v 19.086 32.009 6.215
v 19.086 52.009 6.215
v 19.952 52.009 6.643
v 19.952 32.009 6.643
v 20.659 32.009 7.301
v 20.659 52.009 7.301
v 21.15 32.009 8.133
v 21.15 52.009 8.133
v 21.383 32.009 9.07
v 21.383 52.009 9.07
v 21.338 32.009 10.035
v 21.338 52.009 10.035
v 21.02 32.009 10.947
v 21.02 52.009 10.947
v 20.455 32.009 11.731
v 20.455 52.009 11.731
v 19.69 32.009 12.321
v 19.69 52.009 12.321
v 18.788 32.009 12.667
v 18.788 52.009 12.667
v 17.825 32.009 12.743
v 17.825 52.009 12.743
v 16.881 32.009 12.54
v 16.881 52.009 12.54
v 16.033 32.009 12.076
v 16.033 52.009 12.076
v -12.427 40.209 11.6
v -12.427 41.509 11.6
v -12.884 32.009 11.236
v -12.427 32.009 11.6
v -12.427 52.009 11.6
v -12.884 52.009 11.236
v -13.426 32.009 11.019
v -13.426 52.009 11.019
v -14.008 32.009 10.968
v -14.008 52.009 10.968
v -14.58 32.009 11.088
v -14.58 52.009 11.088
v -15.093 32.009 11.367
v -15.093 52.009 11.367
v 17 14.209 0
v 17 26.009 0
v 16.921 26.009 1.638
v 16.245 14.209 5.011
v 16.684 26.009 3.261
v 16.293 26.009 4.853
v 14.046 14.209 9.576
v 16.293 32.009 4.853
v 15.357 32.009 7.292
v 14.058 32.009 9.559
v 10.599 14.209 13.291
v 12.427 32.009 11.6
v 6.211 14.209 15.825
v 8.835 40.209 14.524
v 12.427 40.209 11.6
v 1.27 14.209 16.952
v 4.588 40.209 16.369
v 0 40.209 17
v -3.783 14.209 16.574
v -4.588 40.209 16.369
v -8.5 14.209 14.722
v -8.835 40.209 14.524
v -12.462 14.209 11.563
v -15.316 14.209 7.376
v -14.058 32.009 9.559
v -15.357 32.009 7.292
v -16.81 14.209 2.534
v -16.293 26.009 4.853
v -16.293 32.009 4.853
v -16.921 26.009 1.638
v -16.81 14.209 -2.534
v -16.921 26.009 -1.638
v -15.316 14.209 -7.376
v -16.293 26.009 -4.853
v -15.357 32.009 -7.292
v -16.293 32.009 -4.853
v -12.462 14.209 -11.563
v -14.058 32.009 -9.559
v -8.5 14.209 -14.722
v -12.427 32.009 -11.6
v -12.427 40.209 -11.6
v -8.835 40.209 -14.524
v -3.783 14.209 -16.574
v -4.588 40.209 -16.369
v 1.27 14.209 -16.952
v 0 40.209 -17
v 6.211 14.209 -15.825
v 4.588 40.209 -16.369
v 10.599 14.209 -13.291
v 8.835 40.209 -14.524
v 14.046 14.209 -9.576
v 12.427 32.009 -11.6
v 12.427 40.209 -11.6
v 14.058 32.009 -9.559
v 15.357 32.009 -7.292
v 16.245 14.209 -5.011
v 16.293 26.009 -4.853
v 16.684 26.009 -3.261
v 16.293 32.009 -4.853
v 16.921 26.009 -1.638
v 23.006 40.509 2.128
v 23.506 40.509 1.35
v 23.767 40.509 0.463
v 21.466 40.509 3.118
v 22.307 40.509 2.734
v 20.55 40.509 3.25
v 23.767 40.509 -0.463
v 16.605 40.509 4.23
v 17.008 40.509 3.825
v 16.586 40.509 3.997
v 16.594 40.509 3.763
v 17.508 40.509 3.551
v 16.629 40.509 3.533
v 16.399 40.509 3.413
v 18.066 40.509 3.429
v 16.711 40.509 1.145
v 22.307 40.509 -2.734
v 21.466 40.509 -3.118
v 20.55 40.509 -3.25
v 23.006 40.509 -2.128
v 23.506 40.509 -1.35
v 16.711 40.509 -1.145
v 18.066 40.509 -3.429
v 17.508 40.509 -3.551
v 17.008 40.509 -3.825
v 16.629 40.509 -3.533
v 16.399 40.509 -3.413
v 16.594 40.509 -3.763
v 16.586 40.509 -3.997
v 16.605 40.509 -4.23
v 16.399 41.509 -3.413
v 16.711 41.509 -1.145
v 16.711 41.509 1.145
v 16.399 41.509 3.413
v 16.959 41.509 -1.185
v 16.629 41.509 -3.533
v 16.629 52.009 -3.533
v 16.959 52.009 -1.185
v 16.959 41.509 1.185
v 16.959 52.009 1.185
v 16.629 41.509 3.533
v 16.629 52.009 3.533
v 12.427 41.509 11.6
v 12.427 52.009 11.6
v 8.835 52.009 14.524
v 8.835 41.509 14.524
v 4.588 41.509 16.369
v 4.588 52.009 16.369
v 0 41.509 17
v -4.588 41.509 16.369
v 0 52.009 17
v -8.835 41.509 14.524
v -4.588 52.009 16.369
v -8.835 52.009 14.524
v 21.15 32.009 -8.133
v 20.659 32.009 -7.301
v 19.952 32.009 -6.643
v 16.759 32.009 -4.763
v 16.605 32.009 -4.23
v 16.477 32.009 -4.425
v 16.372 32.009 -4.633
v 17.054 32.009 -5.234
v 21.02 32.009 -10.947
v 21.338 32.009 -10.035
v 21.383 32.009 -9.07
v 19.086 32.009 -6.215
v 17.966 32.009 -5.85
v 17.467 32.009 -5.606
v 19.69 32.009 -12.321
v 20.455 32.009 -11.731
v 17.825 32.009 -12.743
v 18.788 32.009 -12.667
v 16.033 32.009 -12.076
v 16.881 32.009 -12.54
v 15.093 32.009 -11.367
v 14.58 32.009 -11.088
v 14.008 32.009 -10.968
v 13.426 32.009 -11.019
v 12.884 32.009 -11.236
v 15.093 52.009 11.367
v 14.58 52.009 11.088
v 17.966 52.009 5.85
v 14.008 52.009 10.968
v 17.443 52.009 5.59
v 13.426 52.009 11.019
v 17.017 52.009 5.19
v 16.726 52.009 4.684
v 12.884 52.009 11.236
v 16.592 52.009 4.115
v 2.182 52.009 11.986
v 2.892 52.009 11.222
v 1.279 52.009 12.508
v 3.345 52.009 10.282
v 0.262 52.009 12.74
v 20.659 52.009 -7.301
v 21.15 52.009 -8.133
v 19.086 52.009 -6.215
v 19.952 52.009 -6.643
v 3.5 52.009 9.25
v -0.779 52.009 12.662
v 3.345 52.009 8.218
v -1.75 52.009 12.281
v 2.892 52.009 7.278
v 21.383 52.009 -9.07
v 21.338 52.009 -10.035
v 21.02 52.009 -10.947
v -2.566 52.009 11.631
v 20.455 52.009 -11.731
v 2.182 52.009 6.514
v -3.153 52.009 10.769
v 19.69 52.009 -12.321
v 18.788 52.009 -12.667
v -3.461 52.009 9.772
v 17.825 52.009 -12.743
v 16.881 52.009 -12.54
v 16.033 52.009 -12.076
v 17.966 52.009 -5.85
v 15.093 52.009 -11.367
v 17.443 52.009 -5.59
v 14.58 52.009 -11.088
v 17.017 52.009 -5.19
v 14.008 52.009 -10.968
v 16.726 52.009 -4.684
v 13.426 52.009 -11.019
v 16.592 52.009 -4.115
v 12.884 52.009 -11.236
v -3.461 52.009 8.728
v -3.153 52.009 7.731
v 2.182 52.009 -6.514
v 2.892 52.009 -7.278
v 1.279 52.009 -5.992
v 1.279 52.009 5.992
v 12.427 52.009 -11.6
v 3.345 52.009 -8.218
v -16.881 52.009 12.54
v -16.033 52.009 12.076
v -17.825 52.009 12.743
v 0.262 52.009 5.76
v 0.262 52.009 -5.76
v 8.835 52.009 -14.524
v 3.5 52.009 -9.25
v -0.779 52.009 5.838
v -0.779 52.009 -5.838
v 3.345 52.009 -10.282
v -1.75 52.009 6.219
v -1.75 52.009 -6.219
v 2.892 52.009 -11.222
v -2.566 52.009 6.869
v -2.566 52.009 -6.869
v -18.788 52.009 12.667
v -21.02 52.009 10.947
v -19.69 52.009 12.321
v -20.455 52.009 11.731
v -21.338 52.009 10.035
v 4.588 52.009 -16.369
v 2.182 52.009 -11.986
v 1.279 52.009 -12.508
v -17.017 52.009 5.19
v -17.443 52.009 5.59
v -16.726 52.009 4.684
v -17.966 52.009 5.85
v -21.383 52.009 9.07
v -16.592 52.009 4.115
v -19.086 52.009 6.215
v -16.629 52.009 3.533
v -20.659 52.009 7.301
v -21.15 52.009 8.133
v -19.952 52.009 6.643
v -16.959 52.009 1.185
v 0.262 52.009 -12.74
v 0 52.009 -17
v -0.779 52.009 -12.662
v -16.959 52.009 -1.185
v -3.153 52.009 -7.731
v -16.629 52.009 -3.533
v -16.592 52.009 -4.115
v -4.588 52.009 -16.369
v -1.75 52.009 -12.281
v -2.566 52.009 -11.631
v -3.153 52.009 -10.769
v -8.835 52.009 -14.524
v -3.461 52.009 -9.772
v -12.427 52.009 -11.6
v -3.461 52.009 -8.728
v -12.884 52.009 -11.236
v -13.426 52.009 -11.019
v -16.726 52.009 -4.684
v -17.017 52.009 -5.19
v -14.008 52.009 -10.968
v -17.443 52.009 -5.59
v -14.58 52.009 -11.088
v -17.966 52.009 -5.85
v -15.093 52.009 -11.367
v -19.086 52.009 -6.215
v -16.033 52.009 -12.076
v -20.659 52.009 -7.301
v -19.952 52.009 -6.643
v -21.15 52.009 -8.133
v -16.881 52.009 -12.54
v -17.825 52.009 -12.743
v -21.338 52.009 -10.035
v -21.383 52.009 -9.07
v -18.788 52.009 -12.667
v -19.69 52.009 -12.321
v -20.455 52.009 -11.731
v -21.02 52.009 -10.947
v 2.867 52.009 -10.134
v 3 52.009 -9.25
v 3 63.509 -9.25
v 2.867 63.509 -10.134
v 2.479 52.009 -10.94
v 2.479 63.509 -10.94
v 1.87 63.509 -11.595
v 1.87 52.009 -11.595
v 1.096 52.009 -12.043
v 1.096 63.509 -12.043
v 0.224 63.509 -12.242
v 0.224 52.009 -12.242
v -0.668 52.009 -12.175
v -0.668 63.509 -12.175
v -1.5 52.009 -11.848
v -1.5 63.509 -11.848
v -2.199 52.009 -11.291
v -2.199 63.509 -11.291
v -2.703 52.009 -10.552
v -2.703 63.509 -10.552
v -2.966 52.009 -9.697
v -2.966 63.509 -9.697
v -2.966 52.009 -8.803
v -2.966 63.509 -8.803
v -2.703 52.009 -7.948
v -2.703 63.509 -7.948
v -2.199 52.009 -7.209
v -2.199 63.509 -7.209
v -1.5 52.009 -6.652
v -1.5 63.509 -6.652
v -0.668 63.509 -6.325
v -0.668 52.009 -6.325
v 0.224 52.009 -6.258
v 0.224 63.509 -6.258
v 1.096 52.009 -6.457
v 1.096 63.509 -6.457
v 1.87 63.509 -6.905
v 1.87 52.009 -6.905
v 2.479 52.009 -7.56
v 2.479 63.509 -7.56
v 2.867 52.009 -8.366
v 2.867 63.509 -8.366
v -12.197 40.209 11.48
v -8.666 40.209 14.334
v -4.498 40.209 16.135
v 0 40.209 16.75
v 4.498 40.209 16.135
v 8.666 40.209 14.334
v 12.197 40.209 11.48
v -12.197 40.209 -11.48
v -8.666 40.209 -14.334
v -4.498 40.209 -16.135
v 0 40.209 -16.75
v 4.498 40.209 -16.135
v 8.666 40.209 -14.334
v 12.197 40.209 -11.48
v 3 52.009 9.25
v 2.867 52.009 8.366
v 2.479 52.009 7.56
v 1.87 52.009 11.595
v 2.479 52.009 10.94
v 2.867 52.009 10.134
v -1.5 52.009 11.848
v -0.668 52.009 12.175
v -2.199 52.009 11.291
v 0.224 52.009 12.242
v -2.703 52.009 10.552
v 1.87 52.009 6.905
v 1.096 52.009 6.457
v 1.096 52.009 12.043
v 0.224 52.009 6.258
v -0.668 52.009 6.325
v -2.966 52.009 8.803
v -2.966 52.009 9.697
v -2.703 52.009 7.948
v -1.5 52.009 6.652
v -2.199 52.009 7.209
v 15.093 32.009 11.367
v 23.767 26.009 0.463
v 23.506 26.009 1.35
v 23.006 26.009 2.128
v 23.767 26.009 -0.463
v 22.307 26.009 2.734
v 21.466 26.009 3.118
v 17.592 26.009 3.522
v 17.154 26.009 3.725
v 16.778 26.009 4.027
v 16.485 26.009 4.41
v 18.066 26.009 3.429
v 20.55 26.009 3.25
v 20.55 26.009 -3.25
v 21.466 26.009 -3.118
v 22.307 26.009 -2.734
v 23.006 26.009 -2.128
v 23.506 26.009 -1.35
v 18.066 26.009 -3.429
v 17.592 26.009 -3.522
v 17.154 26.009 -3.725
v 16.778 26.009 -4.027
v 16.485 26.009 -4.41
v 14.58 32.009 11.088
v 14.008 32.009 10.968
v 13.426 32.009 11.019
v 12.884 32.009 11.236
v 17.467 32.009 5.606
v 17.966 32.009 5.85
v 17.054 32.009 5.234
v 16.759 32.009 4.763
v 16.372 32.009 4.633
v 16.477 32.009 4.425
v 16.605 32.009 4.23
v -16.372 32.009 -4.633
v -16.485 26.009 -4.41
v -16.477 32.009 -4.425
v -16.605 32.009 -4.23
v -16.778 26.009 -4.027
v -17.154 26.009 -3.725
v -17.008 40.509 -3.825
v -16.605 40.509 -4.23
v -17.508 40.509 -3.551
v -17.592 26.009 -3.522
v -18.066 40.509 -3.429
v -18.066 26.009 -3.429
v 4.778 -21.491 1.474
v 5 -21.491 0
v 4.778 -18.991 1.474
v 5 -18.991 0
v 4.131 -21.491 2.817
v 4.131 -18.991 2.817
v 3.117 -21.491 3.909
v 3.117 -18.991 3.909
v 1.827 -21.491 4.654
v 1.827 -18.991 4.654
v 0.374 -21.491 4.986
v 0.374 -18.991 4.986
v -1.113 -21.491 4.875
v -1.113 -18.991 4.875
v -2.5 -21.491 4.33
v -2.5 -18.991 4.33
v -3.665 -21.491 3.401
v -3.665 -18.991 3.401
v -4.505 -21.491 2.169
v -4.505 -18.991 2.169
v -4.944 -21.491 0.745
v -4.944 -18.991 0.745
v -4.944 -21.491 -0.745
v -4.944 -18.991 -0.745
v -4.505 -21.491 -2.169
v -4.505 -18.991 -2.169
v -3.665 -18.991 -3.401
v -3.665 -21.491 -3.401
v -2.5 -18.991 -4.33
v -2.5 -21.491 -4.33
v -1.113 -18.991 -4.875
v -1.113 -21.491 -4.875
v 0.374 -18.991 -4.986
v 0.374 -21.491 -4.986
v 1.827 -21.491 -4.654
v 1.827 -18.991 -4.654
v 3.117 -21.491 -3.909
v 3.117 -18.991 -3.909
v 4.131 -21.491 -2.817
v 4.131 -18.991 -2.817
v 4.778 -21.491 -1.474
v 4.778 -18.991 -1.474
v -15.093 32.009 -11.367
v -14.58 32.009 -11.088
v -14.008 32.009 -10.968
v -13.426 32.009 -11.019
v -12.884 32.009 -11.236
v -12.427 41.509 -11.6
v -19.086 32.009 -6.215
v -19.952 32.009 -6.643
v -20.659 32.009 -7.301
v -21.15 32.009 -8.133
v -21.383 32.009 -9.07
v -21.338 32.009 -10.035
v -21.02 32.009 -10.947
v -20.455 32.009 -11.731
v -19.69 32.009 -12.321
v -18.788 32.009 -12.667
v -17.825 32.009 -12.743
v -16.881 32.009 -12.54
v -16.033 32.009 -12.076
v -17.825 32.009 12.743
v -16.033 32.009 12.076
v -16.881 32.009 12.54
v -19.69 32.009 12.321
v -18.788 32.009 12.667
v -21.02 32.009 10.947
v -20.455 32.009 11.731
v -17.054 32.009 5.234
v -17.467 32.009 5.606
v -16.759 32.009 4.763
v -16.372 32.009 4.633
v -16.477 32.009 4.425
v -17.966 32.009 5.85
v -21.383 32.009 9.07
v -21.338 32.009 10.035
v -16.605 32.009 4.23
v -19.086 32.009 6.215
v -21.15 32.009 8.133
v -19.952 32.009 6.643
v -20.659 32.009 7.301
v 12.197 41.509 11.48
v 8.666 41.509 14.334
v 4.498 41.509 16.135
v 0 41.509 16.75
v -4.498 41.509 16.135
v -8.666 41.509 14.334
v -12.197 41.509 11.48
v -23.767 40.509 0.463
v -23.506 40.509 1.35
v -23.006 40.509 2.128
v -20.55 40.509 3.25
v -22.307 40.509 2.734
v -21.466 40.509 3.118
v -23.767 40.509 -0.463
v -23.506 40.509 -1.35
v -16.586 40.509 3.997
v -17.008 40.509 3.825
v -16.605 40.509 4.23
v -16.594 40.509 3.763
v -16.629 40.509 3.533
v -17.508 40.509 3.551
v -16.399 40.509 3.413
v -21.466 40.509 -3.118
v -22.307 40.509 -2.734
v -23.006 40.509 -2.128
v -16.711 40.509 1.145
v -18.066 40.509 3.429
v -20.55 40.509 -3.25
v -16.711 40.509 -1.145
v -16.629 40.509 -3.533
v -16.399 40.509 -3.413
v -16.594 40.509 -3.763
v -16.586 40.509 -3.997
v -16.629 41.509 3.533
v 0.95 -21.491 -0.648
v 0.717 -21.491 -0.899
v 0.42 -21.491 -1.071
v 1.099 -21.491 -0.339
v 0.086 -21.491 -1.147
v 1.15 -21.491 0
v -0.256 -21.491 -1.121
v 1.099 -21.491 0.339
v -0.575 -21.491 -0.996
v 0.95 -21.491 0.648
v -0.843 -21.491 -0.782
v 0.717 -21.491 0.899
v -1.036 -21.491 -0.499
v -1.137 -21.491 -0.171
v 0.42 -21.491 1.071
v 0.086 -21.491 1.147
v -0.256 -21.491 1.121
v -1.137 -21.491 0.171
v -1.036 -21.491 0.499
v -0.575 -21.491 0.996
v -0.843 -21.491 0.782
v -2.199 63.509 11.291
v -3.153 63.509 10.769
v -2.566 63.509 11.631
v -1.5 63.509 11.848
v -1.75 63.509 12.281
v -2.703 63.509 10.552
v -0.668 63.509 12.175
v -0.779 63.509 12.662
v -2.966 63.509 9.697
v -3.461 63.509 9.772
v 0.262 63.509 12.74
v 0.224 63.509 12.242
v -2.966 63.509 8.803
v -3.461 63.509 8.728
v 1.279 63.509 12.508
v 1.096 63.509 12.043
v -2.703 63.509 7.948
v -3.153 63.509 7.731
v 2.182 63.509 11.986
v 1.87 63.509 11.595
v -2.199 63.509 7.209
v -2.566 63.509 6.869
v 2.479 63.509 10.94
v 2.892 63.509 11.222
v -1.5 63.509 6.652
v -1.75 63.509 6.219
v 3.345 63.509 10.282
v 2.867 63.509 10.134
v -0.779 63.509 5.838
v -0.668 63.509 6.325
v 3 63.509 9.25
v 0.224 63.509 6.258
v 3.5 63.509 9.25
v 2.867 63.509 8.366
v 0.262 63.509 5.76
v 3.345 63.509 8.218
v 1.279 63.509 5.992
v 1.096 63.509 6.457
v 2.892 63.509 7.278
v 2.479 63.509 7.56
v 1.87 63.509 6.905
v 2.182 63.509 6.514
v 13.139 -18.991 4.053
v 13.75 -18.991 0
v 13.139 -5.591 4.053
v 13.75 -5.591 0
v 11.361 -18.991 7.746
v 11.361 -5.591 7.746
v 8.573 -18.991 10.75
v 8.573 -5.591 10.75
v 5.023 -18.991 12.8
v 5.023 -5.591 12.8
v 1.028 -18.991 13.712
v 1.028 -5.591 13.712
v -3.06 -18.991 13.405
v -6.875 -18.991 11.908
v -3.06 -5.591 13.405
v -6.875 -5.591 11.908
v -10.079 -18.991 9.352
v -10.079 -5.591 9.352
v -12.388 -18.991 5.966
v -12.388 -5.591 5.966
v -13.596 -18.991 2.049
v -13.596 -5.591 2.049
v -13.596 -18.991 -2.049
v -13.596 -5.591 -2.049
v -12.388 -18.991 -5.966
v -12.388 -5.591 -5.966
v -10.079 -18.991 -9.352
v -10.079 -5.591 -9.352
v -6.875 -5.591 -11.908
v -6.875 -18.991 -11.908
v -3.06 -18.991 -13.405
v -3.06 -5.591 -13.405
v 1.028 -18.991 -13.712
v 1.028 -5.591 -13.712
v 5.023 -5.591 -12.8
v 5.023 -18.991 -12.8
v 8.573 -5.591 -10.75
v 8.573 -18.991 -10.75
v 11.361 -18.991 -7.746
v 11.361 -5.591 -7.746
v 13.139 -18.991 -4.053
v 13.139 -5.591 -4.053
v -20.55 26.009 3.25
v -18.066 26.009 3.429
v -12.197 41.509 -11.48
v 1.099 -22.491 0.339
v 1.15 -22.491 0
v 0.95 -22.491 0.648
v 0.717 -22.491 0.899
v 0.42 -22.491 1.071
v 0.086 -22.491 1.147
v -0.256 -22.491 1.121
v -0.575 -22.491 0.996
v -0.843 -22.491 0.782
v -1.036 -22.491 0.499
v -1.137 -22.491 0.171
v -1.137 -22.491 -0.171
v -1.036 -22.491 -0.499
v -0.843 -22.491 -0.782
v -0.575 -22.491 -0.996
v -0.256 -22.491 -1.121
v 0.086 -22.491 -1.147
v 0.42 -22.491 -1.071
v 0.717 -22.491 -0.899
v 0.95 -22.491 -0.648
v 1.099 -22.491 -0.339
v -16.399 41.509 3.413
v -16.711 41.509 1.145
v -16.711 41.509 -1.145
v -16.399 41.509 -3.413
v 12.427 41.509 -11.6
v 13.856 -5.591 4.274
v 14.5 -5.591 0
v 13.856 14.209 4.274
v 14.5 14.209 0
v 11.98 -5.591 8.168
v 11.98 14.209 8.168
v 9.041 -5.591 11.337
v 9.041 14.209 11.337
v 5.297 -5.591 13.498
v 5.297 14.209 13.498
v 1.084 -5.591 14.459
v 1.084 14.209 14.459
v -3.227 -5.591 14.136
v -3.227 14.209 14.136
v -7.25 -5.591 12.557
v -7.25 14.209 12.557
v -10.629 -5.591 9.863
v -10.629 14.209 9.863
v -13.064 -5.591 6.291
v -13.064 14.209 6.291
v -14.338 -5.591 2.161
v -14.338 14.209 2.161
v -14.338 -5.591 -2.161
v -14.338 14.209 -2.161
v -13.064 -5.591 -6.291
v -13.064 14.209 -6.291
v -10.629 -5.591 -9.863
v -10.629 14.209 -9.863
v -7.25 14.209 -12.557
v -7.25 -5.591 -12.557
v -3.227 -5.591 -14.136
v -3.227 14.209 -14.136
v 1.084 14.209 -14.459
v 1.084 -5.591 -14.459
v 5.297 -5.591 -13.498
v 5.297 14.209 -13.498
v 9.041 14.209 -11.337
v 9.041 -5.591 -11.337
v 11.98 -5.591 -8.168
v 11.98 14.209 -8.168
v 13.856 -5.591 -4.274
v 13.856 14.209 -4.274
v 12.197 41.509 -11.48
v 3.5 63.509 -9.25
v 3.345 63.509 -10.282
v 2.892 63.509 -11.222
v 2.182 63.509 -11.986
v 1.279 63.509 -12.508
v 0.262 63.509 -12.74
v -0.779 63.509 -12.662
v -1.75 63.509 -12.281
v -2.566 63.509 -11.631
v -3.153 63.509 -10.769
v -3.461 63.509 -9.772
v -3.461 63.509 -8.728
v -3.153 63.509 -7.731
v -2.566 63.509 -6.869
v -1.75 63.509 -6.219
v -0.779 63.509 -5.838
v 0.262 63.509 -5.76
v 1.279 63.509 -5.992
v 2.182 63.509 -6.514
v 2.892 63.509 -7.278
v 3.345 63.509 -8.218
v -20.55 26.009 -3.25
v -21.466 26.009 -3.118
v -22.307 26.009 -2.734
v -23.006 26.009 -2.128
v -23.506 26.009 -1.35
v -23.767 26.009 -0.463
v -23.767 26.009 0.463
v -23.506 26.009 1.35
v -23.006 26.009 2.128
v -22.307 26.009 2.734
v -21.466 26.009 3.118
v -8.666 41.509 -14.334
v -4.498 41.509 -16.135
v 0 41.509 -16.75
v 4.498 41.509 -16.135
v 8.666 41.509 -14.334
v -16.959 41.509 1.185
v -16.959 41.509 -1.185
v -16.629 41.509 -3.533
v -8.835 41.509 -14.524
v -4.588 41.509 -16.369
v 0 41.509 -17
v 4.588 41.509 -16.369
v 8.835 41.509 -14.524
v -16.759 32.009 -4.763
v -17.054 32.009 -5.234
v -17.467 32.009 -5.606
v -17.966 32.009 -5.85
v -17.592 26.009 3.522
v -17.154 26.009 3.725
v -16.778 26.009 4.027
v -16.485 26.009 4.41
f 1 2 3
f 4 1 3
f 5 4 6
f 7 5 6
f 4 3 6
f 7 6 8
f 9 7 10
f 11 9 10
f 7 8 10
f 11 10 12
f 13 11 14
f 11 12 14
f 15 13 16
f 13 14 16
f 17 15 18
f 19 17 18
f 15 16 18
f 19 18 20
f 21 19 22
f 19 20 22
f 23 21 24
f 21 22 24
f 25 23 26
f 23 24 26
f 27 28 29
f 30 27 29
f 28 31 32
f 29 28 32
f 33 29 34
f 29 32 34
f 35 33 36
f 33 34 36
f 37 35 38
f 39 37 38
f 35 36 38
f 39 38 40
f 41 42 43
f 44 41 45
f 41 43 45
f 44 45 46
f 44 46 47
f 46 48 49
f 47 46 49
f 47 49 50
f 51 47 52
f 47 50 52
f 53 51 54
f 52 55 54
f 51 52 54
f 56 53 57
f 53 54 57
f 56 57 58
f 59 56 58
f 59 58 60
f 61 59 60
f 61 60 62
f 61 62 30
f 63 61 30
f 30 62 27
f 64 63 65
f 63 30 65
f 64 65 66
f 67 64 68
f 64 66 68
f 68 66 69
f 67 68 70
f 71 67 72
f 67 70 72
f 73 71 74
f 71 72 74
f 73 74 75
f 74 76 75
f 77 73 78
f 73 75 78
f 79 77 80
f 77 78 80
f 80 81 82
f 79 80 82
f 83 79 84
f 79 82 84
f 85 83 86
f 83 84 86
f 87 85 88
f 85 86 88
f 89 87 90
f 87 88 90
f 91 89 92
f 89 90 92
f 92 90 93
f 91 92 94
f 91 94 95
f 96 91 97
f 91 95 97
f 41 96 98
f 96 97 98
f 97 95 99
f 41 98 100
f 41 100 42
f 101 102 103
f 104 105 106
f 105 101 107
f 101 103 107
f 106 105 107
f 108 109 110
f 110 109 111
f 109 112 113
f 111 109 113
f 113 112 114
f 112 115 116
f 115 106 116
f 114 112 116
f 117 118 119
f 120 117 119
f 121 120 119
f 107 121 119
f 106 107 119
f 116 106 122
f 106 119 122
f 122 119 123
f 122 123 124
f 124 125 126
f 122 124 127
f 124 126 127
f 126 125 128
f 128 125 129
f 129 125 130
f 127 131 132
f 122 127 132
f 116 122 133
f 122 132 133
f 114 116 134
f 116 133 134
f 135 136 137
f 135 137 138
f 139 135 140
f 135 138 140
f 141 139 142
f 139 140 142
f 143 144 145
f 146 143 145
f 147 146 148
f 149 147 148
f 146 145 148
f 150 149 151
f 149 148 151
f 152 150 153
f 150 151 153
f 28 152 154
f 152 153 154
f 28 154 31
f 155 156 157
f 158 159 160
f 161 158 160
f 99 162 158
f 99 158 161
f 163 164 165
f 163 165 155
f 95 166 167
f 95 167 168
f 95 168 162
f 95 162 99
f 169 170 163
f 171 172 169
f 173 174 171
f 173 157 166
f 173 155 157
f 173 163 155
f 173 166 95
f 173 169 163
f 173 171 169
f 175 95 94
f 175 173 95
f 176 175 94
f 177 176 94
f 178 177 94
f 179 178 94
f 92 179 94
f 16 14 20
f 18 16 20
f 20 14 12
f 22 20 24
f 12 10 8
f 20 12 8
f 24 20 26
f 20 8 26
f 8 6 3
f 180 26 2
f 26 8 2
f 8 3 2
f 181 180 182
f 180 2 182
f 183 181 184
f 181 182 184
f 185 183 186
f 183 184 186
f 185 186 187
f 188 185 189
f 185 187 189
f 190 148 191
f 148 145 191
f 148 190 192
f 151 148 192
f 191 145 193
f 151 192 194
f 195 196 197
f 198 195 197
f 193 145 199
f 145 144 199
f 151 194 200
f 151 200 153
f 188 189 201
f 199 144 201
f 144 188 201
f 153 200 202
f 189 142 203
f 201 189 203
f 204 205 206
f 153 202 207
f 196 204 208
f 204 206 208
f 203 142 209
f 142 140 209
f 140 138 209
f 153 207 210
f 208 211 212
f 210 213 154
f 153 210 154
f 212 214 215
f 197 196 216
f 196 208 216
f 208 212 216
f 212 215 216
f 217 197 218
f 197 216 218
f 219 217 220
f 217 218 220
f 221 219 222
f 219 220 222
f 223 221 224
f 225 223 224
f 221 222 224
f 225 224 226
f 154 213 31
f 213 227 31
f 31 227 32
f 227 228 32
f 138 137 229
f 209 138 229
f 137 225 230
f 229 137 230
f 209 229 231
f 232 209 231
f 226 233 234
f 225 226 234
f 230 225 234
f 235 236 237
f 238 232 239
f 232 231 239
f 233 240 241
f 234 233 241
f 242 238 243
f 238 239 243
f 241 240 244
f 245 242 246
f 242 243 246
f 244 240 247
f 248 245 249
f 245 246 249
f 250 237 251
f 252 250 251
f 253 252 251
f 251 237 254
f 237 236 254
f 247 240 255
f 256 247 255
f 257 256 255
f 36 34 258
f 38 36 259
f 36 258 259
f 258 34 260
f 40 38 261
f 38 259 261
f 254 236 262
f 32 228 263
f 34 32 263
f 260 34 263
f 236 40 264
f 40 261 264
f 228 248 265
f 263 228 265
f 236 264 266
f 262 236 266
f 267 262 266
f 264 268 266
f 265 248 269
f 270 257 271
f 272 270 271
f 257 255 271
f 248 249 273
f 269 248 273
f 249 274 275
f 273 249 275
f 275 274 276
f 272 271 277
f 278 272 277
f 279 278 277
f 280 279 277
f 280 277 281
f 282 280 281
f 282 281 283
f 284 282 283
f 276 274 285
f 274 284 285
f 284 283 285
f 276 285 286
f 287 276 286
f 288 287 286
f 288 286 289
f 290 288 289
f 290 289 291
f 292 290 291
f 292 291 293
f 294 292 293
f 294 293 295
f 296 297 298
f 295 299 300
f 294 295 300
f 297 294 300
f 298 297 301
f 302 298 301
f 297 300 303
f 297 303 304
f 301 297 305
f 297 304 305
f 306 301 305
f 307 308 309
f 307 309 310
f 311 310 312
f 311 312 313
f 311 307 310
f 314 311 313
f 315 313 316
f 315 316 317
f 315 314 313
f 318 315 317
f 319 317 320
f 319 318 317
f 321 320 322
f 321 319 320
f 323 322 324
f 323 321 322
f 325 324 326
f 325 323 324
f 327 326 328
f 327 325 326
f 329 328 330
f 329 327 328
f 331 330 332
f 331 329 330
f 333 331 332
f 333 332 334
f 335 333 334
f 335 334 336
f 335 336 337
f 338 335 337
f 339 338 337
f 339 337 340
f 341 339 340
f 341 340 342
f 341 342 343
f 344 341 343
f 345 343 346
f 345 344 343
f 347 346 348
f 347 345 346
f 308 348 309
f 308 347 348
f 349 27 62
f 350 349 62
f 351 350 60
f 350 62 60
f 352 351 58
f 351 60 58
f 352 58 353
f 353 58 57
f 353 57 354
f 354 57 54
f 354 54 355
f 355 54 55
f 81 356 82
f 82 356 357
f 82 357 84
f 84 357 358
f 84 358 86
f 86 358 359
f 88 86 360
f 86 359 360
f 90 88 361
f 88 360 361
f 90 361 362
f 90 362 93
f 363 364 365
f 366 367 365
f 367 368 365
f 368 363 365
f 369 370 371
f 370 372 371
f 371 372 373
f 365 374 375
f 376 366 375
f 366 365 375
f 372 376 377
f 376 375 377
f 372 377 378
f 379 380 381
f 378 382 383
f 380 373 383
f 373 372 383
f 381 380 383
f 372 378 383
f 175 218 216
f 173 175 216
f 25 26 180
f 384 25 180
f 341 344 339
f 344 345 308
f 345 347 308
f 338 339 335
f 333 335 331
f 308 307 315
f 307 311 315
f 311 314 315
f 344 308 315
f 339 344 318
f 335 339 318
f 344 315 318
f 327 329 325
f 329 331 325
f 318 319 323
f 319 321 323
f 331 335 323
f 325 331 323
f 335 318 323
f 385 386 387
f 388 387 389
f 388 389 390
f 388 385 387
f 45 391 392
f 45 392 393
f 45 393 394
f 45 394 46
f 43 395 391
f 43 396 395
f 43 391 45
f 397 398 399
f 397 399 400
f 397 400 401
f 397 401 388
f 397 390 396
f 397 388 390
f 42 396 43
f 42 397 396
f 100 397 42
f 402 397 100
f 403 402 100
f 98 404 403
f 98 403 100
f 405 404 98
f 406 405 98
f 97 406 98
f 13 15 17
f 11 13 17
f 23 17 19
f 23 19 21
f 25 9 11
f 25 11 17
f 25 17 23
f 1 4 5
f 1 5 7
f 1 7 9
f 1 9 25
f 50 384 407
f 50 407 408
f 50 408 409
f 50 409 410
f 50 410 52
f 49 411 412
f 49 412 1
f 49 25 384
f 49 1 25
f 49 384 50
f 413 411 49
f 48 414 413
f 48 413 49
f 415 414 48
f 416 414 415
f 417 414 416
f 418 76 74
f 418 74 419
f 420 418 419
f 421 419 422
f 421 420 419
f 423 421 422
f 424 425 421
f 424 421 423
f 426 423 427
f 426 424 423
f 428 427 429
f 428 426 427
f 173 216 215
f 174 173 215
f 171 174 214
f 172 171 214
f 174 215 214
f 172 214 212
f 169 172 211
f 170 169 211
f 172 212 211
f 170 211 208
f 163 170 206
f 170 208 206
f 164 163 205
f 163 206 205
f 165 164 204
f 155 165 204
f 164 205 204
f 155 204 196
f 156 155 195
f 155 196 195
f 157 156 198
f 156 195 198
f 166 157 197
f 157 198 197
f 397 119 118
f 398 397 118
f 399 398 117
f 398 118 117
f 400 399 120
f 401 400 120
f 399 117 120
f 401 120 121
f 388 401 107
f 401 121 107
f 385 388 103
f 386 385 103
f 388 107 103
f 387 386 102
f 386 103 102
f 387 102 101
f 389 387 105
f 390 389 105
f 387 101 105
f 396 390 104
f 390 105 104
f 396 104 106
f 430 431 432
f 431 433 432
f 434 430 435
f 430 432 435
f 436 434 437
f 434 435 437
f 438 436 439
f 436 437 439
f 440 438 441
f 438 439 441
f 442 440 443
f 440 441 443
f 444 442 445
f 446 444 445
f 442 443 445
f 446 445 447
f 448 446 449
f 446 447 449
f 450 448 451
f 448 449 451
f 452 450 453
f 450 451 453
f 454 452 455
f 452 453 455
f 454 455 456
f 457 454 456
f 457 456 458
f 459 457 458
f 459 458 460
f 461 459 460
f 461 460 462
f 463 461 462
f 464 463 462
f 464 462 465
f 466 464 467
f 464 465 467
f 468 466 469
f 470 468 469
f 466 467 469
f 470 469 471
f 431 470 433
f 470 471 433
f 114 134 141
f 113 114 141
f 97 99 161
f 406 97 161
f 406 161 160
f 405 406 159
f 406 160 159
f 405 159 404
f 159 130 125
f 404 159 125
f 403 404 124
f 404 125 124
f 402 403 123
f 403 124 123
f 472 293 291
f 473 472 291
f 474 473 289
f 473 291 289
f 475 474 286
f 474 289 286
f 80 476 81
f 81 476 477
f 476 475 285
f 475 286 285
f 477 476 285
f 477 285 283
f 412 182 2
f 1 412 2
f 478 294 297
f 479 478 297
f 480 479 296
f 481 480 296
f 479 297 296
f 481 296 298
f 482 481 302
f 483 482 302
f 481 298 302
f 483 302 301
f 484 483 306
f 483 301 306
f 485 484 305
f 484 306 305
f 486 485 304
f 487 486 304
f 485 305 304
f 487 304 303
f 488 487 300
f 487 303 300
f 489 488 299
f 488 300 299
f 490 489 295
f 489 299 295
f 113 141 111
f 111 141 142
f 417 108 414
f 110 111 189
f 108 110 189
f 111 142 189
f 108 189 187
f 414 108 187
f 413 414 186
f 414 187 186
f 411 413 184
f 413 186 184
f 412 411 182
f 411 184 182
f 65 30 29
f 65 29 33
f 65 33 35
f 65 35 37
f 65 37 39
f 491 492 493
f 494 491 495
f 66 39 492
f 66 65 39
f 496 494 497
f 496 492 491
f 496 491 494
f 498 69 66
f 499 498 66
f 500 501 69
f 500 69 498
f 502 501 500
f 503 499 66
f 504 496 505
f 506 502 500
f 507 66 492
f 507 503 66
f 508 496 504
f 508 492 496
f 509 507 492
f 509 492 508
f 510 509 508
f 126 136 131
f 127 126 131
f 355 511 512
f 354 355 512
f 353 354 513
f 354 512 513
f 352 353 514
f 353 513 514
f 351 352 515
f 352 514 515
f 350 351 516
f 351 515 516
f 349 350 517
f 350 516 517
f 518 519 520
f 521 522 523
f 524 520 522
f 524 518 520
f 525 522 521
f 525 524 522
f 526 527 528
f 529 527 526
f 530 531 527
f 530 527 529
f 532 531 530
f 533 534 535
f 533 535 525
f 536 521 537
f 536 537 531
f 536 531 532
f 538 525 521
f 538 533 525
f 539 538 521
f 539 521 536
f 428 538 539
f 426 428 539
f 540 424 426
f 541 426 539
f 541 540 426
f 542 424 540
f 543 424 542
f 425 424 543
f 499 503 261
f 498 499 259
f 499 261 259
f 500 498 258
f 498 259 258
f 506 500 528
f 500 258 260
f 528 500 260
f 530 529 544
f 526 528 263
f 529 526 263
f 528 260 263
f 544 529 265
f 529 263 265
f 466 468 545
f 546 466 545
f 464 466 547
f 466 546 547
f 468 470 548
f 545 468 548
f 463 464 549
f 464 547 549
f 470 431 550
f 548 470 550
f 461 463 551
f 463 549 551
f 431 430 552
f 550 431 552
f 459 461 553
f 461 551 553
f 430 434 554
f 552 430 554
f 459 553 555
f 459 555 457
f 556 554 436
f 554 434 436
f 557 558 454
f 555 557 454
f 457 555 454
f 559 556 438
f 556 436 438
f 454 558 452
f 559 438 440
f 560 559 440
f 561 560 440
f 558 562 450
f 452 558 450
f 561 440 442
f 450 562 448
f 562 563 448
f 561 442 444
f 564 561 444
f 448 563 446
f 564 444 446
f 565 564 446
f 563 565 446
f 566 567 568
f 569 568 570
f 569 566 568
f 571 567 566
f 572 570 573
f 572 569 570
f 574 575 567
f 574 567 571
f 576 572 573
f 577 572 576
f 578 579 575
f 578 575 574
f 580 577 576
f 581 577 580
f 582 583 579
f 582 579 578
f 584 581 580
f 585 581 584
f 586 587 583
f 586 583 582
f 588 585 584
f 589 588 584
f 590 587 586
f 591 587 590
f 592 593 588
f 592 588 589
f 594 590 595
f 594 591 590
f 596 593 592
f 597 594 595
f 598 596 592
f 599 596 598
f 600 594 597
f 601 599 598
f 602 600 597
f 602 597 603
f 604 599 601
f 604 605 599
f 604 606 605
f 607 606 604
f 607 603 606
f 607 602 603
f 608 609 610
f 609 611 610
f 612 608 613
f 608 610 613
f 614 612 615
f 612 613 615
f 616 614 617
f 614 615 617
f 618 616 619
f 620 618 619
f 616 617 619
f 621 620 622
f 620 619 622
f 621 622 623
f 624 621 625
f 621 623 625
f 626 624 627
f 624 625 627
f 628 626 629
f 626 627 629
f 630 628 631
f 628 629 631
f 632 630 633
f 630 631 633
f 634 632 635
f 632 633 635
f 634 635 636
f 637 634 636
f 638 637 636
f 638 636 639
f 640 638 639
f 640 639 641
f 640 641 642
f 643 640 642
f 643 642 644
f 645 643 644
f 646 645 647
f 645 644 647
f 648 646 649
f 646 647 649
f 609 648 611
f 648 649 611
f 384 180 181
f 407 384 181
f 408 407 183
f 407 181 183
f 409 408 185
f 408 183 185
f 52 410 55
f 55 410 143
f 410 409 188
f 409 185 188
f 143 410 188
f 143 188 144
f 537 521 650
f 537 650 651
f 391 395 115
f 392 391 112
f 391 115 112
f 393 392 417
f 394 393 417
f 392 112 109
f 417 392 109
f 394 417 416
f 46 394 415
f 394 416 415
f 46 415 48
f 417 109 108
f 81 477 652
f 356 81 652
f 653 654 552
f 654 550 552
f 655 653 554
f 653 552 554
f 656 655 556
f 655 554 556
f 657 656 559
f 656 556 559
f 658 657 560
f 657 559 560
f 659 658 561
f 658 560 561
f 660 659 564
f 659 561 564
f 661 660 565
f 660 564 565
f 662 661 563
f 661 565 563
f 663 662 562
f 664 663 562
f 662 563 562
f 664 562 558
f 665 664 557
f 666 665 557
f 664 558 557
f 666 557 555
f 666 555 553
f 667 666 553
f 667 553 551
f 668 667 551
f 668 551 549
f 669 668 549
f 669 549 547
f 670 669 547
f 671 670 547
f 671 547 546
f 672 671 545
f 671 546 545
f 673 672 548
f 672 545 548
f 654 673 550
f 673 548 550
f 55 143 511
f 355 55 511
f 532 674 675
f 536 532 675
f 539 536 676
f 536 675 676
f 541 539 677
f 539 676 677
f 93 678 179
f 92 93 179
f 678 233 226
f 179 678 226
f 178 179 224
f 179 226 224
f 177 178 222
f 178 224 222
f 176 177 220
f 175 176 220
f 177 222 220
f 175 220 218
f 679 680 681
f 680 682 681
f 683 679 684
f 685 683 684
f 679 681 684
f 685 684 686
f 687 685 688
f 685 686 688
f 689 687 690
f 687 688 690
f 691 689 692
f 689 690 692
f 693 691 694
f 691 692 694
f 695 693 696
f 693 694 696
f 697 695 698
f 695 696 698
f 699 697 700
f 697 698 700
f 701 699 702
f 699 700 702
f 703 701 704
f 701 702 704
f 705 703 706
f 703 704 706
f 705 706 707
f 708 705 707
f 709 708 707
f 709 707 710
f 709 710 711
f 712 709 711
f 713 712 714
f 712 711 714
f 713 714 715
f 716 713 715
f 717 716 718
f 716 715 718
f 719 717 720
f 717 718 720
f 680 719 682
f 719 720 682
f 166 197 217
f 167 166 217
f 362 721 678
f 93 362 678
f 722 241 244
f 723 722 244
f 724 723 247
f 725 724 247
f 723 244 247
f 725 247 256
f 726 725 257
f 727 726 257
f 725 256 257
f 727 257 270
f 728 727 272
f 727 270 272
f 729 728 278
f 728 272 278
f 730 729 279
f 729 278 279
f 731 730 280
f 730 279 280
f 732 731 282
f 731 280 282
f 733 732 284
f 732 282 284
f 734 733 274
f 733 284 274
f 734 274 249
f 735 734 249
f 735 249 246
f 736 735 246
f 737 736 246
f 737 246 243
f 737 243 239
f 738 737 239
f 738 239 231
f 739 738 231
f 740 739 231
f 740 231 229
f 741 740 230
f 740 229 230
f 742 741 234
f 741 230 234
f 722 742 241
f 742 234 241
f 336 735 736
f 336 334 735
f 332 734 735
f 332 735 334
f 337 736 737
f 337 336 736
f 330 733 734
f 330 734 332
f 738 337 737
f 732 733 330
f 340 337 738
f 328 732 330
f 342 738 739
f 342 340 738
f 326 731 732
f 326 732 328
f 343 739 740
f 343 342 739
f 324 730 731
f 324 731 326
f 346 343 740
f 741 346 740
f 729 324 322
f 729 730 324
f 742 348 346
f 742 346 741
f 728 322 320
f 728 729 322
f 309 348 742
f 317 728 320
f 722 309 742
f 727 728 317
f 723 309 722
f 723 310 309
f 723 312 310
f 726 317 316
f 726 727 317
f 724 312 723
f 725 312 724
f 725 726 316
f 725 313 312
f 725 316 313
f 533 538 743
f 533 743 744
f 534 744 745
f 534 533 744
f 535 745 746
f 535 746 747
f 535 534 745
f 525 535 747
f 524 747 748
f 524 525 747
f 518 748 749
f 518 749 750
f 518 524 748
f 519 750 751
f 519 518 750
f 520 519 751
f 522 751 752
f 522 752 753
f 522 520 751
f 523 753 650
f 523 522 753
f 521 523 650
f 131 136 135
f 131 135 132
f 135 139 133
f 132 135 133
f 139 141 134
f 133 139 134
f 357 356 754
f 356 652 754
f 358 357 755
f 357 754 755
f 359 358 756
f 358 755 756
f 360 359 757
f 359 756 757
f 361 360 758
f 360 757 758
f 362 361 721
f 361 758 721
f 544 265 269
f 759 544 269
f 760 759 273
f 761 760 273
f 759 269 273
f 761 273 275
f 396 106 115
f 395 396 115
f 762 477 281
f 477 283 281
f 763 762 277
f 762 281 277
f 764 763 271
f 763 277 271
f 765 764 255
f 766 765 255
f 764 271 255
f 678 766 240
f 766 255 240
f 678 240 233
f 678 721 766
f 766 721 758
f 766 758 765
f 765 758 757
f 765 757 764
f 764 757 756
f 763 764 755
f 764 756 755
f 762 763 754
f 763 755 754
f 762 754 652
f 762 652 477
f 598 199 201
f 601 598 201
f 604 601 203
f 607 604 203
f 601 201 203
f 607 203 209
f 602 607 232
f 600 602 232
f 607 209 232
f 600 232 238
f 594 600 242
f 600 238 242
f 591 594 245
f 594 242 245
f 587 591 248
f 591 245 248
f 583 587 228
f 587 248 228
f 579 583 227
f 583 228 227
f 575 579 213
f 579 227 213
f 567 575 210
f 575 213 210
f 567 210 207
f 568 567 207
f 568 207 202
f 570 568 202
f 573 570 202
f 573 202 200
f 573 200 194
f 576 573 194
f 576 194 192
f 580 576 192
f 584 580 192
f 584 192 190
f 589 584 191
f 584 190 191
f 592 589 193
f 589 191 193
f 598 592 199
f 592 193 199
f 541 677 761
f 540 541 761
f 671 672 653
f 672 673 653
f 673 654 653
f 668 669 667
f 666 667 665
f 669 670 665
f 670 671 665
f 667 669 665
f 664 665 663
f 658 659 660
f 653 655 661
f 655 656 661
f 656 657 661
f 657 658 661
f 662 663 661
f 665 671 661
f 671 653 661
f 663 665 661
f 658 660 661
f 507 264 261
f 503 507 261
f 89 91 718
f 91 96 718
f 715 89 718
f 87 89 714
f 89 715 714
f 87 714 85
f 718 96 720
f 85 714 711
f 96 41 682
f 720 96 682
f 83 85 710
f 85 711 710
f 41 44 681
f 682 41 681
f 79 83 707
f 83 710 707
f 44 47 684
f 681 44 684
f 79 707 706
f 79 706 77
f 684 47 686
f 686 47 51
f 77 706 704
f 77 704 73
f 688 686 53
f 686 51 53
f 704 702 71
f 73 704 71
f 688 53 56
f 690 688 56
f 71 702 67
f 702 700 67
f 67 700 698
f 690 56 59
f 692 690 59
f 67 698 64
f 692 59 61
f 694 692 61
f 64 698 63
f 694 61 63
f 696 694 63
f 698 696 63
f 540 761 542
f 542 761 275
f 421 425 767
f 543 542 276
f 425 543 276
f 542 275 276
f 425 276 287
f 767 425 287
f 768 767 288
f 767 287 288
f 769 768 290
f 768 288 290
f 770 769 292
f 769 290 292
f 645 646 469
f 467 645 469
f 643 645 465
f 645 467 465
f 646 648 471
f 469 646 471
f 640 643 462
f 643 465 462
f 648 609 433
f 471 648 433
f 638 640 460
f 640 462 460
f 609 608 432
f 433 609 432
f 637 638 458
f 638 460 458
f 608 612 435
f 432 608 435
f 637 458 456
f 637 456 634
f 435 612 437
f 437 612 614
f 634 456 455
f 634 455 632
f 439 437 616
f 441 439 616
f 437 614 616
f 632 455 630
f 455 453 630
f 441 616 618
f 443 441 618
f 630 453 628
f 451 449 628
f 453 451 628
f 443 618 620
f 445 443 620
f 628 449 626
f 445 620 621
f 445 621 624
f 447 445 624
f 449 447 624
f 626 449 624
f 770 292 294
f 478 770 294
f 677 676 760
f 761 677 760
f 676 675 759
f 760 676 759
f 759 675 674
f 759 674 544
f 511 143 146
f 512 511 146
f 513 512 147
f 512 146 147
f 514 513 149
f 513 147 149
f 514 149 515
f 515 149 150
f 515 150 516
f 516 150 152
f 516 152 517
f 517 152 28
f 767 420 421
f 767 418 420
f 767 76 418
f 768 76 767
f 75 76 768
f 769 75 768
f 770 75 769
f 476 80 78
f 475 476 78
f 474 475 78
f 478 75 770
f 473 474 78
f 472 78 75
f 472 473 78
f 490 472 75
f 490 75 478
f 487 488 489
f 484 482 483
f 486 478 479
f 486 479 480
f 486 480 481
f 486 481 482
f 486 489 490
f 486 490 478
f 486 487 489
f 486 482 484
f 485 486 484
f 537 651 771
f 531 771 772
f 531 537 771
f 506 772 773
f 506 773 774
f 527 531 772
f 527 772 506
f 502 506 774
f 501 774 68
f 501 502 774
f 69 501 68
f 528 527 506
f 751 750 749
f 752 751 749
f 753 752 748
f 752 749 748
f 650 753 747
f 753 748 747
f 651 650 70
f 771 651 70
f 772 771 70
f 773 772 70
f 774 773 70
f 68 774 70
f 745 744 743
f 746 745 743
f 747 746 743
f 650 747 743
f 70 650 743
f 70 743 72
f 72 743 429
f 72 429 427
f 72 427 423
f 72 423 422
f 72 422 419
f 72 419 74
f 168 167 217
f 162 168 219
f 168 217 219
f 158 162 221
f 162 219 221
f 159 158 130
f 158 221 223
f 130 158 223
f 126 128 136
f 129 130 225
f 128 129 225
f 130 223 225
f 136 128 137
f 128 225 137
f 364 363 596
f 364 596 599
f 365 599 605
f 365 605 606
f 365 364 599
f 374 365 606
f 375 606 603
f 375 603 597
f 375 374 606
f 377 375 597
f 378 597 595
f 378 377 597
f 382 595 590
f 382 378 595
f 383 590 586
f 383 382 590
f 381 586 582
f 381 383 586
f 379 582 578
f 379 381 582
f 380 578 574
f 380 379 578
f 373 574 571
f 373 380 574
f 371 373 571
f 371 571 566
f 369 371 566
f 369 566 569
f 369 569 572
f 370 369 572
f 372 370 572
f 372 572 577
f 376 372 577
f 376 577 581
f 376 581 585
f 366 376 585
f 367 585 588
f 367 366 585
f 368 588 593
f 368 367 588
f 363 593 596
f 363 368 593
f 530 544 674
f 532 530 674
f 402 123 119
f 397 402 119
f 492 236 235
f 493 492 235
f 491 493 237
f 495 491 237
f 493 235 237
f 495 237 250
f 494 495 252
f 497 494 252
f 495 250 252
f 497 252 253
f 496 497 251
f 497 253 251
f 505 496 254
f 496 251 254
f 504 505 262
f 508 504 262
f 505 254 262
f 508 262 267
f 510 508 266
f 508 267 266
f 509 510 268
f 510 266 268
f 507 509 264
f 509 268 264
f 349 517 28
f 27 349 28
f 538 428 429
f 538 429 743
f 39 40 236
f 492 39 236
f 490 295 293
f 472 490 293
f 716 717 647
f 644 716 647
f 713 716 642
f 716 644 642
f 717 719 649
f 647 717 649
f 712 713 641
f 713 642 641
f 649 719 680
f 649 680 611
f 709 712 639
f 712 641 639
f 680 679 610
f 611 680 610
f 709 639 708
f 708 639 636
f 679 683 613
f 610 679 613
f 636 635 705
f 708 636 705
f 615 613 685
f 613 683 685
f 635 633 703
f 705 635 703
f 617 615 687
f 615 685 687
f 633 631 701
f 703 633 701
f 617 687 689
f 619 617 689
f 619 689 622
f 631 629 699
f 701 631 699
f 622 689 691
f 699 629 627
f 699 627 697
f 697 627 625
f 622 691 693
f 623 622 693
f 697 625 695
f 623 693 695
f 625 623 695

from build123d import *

# Parameters (mm, degrees)
RESSALTO_EXTRUS_O1_DEPTH = 20
RESSALTO_EXTRUS_O2_START = -11.5
RESSALTO_EXTRUS_O2_DEPTH = 14.5
ESBO_O4_R                = 3.5
ESBO_O4_R_2              = 3
RESSALTO_EXTRUS_O3_DEPTH = 11.5


with BuildPart() as part:
    # Esboço1 → Revolução1 (revolve)
    with BuildSketch(Plane.XY):
        Polygon((0, 52.008683422), (0, -22.491316578), (1.15, -22.491316578), (1.15, -21.491316578), (5, -21.491316578), (5, -18.991316578), (13.75, -18.991316578), (13.75, -5.591316578), (14.5, -5.591316578), (14.5, 14.208683422), (17, 14.208683422), (17, 40.208683422), (16.75, 40.208683422), (16.75, 41.508683422), (17, 41.508683422), (17, 52.008683422), align=None)
    revolve(axis=Axis((0, 52.008683422, 0), (0, -1, 0)))

    # Esboço2 → Ressalto-extrusão1 (add)
    with BuildSketch(Plane(origin=(0, 52.008683422, 0), x_dir=(1, 0, 0), z_dir=(0, 1, 0))):
        with BuildLine():
            Line((15.092560694, 11.367260519), (16.033467531, 12.075923108))
            ThreePointArc((16.033467531, 12.075923108), (21.020085445, 10.947420147), (19.086085546, 6.214606868))
            Line((19.086085546, 6.214606868), (17.966039096, 5.849909332))
            ThreePointArc((17.966039096, 5.849909332), (16.852954176, 4.947741706), (16.628916094, 3.532583974))
            Line((16.628916094, 3.532583974), (9.846019669, 0))
            Line((9.846019669, 0), (16.628916094, -3.532583974))
            ThreePointArc((16.628916094, -3.532583974), (16.852954176, -4.947741706), (17.966039096, -5.849909332))
            Line((17.966039096, -5.849909332), (19.086085546, -6.214606868))
            ThreePointArc((19.086085546, -6.214606868), (21.020085445, -10.947420147), (16.033467531, -12.075923108))
            Line((16.033467531, -12.075923108), (15.092560694, -11.367260519))
            ThreePointArc((15.092560694, -11.367260519), (13.715258298, -10.972415516), (12.427288325, -11.600107969))
            Line((12.427288325, -11.600107969), (0, -5.127881824))
            Line((0, -5.127881824), (-12.427288325, -11.600107969))
            ThreePointArc((-12.427288325, -11.600107969), (-13.715258298, -10.972415516), (-15.092560694, -11.367260519))
            Line((-15.092560694, -11.367260519), (-16.033467531, -12.075923108))
            ThreePointArc((-16.033467531, -12.075923108), (-21.020085445, -10.947420147), (-19.086085546, -6.214606868))
            Line((-19.086085546, -6.214606868), (-17.966039096, -5.849909332))
            ThreePointArc((-17.966039096, -5.849909332), (-16.852954176, -4.947741706), (-16.628916094, -3.532583974))
            Line((-16.628916094, -3.532583974), (-9.846019669, 0))
            Line((-9.846019669, 0), (-16.628916094, 3.532583974))
            ThreePointArc((-16.628916094, 3.532583974), (-16.852954176, 4.947741706), (-17.966039096, 5.849909332))
            Line((-17.966039096, 5.849909332), (-19.086085546, 6.214606868))
            ThreePointArc((-19.086085546, 6.214606868), (-21.020085445, 10.947420147), (-16.033467531, 12.075923108))
            Line((-16.033467531, 12.075923108), (-15.092560694, 11.367260519))
            ThreePointArc((-15.092560694, 11.367260519), (-13.715258298, 10.972415516), (-12.427288325, 11.600107969))
            Line((-12.427288325, 11.600107969), (0, 5.127881824))
            Line((0, 5.127881824), (12.427288325, 11.600107969))
            ThreePointArc((12.427288325, 11.600107969), (13.715258298, 10.972415516), (15.092560694, 11.367260519))
        make_face()
    extrude(amount=-RESSALTO_EXTRUS_O1_DEPTH)

    # Esboço3 → Ressalto-extrusão2 (add)
    with BuildSketch(Plane(origin=(0, 52.008683422, 0), x_dir=(1, 0, 0), z_dir=(0, 1, 0)).offset(RESSALTO_EXTRUS_O2_START)):
        with BuildLine():
            Line((-20.55, -3.25), (-18.065620285, -3.429043833))
            ThreePointArc((-18.065620285, -3.429043833), (-16.957055718, -3.864486935), (-16.292605909, -4.852936501))
            Line((-16.292605909, -4.852936501), (-16.292605909, 4.852936501))
            ThreePointArc((-16.292605909, 4.852936501), (-16.957055718, 3.864486935), (-18.065620285, 3.429043833))
            Line((-18.065620285, 3.429043833), (-20.55, 3.25))
            ThreePointArc((-20.55, 3.25), (-23.8, 0), (-20.55, -3.25))
        make_face()
        with BuildLine():
            Line((16.292605909, -4.852936501), (16.292605909, 4.852936501))
            ThreePointArc((16.292605909, 4.852936501), (16.957055718, 3.864486935), (18.065620285, 3.429043833))
            Line((18.065620285, 3.429043833), (20.55, 3.25))
            ThreePointArc((20.55, 3.25), (23.8, 0), (20.55, -3.25))
            Line((20.55, -3.25), (18.065620285, -3.429043833))
            ThreePointArc((18.065620285, -3.429043833), (16.957055718, -3.864486935), (16.292605909, -4.852936501))
        make_face()
    extrude(amount=-RESSALTO_EXTRUS_O2_DEPTH)

    # Esboço4 → Ressalto-extrusão3 (add)
    with BuildSketch(Plane(origin=(0, 52.008683422, 0), x_dir=(1, 0, 0), z_dir=(0, 1, 0))):
        with Locations((0, -9.25)):
            Circle(ESBO_O4_R)
        with Locations((0, -9.25)):
            Circle(ESBO_O4_R_2, mode=Mode.SUBTRACT)
        with Locations((0, 9.25)):
            Circle(ESBO_O4_R)
        with Locations((0, 9.25)):
            Circle(ESBO_O4_R_2, mode=Mode.SUBTRACT)
    extrude(amount=RESSALTO_EXTRUS_O3_DEPTH)


solid = part.part
